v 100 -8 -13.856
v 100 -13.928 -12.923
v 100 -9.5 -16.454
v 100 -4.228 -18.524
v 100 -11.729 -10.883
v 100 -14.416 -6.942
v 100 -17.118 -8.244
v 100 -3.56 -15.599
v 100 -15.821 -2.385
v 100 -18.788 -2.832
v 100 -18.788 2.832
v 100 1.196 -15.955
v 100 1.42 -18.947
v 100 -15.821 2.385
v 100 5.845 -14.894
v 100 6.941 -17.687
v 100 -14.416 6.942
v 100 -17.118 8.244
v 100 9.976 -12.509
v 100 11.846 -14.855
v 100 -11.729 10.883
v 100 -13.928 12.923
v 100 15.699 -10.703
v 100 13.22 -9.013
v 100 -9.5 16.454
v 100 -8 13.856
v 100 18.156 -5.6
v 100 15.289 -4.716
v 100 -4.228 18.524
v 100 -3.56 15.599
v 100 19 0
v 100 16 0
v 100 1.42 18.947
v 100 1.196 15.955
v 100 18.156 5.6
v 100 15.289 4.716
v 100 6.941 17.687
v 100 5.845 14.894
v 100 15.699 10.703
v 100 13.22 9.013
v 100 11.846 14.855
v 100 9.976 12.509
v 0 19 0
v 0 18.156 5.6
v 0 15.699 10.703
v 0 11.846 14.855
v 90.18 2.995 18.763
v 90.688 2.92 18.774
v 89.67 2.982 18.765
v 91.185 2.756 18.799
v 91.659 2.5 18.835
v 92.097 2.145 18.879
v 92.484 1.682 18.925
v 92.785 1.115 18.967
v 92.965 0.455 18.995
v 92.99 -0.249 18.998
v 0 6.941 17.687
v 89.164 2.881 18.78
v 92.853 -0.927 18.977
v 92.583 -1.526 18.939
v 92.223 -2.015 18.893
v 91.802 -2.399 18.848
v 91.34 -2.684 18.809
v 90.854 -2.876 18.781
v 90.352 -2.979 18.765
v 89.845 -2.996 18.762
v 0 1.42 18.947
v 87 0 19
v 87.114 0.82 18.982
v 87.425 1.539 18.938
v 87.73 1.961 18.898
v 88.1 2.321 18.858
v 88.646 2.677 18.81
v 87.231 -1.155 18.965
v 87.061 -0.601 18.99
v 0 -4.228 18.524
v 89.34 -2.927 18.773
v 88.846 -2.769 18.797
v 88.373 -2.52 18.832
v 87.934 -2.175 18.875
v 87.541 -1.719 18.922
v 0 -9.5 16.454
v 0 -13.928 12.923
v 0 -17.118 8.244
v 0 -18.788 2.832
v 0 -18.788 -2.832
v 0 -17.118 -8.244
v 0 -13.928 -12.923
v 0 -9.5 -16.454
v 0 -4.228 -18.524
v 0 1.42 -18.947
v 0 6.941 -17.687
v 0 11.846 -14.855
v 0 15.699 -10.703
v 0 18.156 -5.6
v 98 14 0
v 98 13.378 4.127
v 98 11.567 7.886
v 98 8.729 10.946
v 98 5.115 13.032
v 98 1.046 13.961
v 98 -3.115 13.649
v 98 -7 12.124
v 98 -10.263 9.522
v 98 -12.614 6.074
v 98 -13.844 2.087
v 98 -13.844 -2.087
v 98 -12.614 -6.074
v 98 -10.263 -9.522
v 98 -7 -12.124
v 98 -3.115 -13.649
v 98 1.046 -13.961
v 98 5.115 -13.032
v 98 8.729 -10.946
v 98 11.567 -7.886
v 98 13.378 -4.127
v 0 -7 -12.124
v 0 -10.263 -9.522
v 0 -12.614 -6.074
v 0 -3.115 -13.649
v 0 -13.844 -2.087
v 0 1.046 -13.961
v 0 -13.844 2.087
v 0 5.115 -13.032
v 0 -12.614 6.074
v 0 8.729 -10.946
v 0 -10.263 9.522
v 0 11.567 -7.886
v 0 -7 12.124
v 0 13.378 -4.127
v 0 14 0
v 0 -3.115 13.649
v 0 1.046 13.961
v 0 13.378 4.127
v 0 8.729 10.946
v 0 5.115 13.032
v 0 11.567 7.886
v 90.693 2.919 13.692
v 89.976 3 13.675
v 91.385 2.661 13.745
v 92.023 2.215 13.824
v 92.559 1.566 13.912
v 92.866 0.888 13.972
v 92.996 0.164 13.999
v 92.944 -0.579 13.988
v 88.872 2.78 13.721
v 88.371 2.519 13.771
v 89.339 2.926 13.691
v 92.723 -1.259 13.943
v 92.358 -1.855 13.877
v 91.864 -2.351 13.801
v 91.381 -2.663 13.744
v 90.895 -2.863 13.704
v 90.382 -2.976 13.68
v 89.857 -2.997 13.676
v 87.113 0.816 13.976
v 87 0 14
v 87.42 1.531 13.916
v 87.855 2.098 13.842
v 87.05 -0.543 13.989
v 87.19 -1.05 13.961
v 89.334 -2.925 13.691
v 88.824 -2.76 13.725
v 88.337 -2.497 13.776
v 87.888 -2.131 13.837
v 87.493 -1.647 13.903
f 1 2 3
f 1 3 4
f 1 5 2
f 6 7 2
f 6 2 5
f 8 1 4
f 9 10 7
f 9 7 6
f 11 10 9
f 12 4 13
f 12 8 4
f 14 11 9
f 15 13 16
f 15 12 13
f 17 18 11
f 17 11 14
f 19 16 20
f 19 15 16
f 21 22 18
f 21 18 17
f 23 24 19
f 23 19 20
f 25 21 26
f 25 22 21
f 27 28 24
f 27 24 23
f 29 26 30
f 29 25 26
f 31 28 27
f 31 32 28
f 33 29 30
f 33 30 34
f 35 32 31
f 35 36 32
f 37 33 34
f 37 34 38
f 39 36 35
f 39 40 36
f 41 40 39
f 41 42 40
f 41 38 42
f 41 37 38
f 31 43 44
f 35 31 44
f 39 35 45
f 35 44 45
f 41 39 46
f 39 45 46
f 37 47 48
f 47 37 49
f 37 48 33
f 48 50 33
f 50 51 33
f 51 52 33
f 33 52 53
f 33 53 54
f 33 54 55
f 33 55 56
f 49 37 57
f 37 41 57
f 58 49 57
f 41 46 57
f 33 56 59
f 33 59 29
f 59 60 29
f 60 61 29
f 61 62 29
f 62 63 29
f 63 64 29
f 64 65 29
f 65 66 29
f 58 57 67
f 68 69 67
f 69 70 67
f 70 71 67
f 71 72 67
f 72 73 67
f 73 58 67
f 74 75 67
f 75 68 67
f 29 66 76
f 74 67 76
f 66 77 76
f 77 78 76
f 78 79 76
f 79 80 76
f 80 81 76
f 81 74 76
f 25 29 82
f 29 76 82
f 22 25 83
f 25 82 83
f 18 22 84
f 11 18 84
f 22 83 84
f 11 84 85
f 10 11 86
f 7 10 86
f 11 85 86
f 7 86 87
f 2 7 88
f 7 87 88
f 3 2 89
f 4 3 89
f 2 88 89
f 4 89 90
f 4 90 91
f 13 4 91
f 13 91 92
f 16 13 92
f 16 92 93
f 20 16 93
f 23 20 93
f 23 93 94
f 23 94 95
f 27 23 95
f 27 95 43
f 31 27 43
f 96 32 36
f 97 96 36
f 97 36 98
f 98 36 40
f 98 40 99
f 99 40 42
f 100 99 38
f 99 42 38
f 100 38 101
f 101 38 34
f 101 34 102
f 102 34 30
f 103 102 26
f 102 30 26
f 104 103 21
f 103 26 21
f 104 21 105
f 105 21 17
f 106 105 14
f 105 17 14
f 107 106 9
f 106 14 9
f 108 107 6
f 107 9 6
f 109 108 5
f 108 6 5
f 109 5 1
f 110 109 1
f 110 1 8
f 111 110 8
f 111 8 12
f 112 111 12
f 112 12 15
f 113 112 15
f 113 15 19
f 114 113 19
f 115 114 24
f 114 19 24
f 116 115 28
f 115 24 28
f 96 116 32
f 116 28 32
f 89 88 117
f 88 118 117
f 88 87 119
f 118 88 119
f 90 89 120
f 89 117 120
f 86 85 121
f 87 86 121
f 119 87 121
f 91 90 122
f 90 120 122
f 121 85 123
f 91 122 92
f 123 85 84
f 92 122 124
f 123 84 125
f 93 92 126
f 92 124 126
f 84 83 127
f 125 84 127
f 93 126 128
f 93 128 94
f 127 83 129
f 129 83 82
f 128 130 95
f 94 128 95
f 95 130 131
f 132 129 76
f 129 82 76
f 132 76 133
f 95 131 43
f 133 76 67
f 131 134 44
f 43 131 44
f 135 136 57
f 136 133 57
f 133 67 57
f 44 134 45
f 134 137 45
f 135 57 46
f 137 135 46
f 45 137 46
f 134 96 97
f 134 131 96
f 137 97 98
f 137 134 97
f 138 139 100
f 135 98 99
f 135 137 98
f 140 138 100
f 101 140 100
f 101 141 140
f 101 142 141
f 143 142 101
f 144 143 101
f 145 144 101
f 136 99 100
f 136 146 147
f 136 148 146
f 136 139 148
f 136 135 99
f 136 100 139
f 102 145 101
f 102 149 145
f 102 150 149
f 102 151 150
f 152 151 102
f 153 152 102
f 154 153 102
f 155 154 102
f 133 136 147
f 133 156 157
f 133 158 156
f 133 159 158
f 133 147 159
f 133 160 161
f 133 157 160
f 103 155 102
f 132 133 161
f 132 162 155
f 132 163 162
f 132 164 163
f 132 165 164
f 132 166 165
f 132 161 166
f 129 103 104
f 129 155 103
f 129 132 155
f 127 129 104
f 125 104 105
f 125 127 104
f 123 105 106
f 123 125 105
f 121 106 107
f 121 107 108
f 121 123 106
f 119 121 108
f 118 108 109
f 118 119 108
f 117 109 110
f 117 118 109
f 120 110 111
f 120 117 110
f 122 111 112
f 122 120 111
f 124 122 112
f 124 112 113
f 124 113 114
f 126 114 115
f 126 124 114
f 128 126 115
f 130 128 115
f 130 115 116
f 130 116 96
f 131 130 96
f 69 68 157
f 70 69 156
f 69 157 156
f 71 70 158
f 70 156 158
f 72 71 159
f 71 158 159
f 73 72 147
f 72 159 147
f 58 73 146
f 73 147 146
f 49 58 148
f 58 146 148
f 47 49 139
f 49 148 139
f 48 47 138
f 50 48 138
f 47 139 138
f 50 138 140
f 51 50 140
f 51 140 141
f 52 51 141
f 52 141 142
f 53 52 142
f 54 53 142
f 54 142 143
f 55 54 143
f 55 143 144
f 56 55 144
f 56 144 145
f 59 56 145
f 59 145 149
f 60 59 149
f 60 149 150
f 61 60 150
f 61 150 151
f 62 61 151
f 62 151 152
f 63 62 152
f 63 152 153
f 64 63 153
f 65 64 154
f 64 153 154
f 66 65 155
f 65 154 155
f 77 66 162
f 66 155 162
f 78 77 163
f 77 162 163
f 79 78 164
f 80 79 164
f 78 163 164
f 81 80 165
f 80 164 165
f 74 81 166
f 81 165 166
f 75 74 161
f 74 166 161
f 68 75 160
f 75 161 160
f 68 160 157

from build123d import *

# Parameters (mm, degrees)
F0_R     = 19
F0_R_2   = 14
F1_DEPTH = 100
F4_SIZE2 = 2
F4_SIZE  = 2
F5_D     = 6
F5_DEPTH = 15


with BuildPart() as f1:
    # F0 (on Right) → F1 (new body)
    with BuildSketch(Plane.YZ):
        Circle(F0_R)
        Circle(F0_R_2, mode=Mode.SUBTRACT)
    extrude(amount=F1_DEPTH)

    # F4
    f4_edges = [f1.edges().sort_by_distance(p)[0] for p in [
        (100, -14, 0),
    ]]
    chamfer(f4_edges, length=F4_SIZE, length2=F4_SIZE2)

    # F5
    with Locations(Plane.XY.offset(19)):
        with Locations((90, 0)):
            Hole(F5_D / 2, depth=F5_DEPTH)


solid = f1.part
